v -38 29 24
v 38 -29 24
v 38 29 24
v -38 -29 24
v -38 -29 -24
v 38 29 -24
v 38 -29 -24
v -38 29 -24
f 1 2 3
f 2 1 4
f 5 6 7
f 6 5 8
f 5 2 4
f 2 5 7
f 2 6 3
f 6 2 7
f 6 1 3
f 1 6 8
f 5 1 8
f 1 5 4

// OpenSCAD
// ============================================================================
// Atom Lithography Machine — Parametric OpenSCAD Module (S6.7-02)
// ============================================================================
// part_id           : S6.7-02
// parent_bom_id     : S6.7
// subsystem         : S6
// part_name         : Kriyo-CMOS / DC kapi-gerilimi coklayici dagitim kartlari (4 K / MXC)
// material          : OFHC Cu
// temp_stage        : 4 K / 20 mK
// vacuum_grade      : Kriyo-vakum
// tolerance         : ±0.1 mV
// computed_mass_kg  : 0.44270
// envelope_mm       : 76.000 x 58.000 x 48.000
// design_maturity   : M0_M1_DETAILED_CAD_DESIGN_ONLY
// no_lab_measurement: true
// iec61508_certified: false
// semi_s2_certified : false
// Units: millimeters (mm)
// ============================================================================

$fn = 64;

// Nominal bounding envelope parameters (mm)
bbox_x = 76.0000;
bbox_y = 58.0000;
bbox_z = 48.0000;

// Part-specific parametric dimensions
n_cards = 8;
cage_dx = 76.0;
cage_dy = 58.0;
cage_dz = 48.0;

// Interface / port parameters (mm)
port_cage_4k_thermal_bolts = 4;

module part_S6_7_02() {
  union() {
    // 4 K 8-card cryo-CMOS DC gate mux cage
    cube([76.000, 58.000, 48.000], center=true);
  }
}

// World assembly mounting transform (global machine frame, mm / deg):
// translate([-650.000, 0.000, 656.000]) rotate([0.000, 0.000, 0.000]) part_S6_7_02();

part_S6_7_02();
